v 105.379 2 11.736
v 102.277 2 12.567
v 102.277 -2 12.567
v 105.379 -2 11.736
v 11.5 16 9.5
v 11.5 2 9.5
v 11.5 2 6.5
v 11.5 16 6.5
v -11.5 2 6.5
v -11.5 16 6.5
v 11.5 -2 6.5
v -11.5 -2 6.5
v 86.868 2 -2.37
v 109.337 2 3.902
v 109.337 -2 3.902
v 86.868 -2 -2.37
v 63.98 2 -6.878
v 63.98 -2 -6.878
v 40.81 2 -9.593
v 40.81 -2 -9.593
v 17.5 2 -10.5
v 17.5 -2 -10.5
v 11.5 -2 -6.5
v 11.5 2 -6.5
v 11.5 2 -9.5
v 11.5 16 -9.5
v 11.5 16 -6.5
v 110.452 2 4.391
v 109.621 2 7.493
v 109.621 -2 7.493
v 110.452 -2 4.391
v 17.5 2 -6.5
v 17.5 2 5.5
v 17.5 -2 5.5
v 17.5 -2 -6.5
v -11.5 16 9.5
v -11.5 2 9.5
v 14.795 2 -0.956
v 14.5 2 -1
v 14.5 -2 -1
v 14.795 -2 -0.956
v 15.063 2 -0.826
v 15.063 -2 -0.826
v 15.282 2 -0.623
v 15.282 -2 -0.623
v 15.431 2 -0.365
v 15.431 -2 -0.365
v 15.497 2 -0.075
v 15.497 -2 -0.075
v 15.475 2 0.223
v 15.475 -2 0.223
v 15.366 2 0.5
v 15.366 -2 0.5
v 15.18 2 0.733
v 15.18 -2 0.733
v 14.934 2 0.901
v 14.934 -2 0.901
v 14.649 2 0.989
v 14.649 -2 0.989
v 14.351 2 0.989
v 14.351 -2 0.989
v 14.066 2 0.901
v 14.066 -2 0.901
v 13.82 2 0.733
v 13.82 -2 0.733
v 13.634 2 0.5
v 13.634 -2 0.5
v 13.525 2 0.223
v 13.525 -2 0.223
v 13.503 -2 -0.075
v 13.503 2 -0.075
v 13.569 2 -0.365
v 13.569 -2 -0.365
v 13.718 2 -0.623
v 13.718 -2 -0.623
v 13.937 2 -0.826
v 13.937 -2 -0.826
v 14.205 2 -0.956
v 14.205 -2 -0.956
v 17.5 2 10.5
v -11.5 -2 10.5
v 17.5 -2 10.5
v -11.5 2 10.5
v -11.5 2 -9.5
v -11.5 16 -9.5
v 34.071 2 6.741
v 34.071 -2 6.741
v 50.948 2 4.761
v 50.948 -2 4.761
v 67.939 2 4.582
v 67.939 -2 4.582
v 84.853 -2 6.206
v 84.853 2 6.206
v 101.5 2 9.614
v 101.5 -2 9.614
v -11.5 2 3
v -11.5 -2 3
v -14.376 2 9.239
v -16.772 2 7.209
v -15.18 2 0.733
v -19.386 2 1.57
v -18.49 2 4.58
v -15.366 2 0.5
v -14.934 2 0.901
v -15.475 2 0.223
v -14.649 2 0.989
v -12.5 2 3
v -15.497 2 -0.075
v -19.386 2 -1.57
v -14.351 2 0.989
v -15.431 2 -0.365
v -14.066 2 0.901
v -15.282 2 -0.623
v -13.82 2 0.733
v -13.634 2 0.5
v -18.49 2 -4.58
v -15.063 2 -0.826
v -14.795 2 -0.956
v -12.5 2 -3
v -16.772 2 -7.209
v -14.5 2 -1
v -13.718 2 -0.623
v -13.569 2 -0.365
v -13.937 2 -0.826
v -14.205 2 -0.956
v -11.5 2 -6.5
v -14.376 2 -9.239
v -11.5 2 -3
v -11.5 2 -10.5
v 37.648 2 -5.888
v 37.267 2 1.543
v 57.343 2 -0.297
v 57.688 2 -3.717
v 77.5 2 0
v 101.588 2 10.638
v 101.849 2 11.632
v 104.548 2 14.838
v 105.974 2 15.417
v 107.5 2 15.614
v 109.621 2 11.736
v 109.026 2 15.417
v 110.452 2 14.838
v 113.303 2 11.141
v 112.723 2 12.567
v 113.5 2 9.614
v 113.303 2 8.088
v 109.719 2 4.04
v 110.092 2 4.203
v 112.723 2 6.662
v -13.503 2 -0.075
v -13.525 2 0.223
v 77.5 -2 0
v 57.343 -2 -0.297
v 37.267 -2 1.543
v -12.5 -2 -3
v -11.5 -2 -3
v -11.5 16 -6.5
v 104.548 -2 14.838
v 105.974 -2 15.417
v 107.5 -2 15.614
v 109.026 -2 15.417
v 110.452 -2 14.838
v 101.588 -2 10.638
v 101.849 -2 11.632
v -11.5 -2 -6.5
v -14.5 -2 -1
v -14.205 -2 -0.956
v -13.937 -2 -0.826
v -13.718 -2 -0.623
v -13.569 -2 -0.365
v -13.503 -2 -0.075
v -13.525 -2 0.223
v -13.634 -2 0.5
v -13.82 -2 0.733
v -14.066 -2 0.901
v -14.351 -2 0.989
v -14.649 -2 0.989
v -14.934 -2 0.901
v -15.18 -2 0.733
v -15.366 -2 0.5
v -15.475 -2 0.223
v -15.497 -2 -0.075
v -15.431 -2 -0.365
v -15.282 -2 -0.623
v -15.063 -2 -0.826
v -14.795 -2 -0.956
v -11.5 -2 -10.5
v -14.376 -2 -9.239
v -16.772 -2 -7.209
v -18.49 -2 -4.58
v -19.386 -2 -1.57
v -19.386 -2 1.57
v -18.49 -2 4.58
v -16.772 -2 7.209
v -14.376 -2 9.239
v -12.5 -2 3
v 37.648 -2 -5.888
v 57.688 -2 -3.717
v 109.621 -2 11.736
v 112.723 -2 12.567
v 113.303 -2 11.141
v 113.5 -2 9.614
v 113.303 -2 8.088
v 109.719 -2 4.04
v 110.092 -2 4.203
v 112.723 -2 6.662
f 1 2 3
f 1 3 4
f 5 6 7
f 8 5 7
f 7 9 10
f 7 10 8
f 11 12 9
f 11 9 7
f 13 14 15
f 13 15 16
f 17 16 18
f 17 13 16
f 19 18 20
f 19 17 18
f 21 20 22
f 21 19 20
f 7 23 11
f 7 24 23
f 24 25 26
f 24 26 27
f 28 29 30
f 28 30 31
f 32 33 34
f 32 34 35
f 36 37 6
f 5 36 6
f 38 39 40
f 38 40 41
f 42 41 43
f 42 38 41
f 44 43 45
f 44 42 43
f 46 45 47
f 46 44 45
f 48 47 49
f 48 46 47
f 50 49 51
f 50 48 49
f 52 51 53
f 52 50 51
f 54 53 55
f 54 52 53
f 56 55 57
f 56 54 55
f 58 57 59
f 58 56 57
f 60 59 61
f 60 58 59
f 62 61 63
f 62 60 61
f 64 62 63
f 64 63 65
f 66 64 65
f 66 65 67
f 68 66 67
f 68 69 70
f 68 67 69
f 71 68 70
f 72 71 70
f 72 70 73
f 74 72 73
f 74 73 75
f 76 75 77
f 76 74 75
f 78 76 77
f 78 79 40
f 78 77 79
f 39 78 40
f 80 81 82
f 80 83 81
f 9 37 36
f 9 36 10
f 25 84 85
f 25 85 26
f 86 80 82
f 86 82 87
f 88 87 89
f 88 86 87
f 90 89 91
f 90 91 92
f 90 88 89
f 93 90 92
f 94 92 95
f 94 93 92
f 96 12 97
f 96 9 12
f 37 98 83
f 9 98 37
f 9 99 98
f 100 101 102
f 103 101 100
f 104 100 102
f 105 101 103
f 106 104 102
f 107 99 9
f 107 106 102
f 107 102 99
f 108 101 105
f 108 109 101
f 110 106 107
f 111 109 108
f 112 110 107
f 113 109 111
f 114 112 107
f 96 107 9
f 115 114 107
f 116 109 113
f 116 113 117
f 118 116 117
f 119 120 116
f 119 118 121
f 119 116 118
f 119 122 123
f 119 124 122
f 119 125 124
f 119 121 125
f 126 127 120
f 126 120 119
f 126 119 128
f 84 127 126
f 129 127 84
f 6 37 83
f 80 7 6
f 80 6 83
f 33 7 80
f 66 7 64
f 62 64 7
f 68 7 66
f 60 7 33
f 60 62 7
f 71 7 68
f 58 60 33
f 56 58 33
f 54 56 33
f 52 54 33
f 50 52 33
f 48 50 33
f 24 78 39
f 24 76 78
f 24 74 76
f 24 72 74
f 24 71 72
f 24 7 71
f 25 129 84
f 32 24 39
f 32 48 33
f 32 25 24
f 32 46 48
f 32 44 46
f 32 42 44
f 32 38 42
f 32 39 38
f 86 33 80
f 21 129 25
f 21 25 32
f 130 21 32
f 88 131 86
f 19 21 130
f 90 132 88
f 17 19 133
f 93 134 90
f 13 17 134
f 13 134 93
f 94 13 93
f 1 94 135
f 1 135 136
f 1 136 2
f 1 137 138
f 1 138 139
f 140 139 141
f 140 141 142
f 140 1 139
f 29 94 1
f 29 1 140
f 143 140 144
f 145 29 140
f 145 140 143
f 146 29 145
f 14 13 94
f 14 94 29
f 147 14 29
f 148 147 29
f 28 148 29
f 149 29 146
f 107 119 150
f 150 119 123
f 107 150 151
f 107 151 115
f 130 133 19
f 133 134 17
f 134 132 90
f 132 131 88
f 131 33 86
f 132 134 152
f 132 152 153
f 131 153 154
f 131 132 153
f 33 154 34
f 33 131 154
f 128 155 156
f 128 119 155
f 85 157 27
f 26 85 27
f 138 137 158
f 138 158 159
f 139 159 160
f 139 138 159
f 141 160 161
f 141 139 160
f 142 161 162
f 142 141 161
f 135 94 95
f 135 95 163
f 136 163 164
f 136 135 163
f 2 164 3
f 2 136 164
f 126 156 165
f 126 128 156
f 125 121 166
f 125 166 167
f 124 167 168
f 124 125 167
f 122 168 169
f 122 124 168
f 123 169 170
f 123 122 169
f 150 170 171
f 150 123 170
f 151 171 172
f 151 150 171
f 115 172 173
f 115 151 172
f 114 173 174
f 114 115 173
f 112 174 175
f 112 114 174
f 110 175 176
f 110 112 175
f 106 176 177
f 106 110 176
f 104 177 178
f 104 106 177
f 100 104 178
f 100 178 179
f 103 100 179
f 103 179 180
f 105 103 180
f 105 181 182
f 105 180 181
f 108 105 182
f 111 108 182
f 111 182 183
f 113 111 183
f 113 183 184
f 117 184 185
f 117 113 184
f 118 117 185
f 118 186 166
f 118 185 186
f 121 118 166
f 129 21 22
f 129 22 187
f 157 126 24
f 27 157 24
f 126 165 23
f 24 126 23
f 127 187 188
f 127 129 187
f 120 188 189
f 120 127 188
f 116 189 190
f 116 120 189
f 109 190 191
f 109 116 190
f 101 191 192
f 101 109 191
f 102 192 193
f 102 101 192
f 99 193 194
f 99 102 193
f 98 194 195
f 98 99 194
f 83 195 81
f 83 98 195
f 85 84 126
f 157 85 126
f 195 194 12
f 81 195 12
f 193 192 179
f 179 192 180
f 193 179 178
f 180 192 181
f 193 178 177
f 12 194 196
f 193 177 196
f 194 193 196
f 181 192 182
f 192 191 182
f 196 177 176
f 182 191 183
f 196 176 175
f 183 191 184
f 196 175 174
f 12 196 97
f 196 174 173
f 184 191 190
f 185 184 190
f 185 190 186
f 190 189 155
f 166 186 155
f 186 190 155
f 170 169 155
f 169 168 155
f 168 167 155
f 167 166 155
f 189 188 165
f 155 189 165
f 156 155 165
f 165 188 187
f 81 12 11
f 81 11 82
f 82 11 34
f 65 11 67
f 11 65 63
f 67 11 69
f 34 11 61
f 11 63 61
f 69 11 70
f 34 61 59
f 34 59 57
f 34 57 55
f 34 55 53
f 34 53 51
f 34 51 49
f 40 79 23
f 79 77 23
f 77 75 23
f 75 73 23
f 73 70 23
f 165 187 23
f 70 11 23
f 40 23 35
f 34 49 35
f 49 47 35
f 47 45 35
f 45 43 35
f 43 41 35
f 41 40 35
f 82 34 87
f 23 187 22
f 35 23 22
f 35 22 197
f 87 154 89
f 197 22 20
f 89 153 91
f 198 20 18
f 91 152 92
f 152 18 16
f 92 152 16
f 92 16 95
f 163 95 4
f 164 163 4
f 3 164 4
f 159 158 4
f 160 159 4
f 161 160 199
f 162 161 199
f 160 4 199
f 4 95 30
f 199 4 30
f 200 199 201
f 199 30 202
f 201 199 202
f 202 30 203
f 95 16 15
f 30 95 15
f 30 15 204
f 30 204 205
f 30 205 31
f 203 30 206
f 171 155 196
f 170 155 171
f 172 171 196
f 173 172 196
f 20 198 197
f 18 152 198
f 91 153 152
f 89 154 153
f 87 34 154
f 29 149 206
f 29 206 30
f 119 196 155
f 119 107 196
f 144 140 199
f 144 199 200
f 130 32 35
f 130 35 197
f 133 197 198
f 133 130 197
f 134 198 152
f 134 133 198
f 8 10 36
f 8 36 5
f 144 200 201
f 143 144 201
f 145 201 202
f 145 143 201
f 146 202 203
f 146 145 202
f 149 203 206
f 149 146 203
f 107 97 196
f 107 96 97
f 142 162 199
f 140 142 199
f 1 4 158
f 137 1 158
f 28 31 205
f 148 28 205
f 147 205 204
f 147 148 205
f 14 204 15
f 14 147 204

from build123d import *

# Parameters (mm, degrees)
EXTRUDE_1_DEPTH          = 2
EXTRUDE_2_DEPTH          = 4
CUT_EXTRUDE_1_DEPTH      = 115.638809515
CUT_EXTRUDE_1_DEPTH_BACK = 115.638809515
CUT_EXTRUDE_2_DEPTH      = 115.638809515
CUT_EXTRUDE_2_DEPTH_BACK = 115.638809515
SKETCH_5_R               = 1
SKETCH_6_W               = 23
SKETCH_6_H               = 3
EXTRUDE_3_DEPTH          = 14


with BuildPart() as part:
    # 草图1 → 凸台-拉伸1 (new, symmetric)
    with BuildSketch(Plane(origin=(0, 0, 0), x_dir=(1, 0, 0), z_dir=(0, 1, 0))):
        with BuildLine():
            Line((-11.5, -10.5), (17.5, -10.5))
            Line((17.5, -10.5), (17.5, 10.5))
            Line((17.5, 10.5), (-11.5, 10.5))
            ThreePointArc((-11.5, 10.5), (-19.5, 0), (-11.5, -10.5))
        make_face()
        Polygon((11.5, -6.5), (-11.5, -6.5), (-11.5, -3), (-12.5, -3), (-12.5, 3), (-11.5, 3), (-11.5, 6.5), (11.5, 6.5), align=None, mode=Mode.SUBTRACT)
    extrude(amount=EXTRUDE_1_DEPTH, both=True)

    # 草图2 → 凸台-拉伸2 (add)
    with BuildSketch(Plane(origin=(0, 2, 0), x_dir=(1, 0, 0), z_dir=(0, 1, 0))):
        with BuildLine():
            Line((17.5, -5.5), (17.5, -10.5))
            ThreePointArc((17.5, -10.5), (59.440835798, -4.44595009), (101.5, -9.614309047))
            ThreePointArc((101.5, -9.614309047), (111.034090536, -14.463041261), (109.336734694, -3.902356171))
            ThreePointArc((109.336734694, -3.902356171), (63.979602253, 6.877540604), (17.5, 10.5))
            Line((17.5, 10.5), (17.5, 6.5))
            ThreePointArc((17.5, 6.5), (47.689236459, 4.99679808), (77.5, 0))
            ThreePointArc((77.5, 0), (47.280596762, -0.356510126), (17.5, -5.5))
        make_face()
    extrude(amount=-EXTRUDE_2_DEPTH)

    # 草图4 → 切除-拉伸1 (cut, two sides: drawn at the far end of the back side and taken through both)
    with BuildSketch(Plane.XZ.offset(2).offset(-CUT_EXTRUDE_1_DEPTH_BACK)):
        with BuildLine():
            Line((102.276706609, 12.566800564), (105.378679656, 11.735629391))
            Line((105.378679656, 11.735629391), (104.547508484, 14.837602438))
            ThreePointArc((104.547508484, 14.837602438), (103.257359313, 13.856949735), (102.276706609, 12.566800564))
        make_face()
        with BuildLine():
            Line((110.452491516, 14.837602438), (109.621320344, 11.735629391))
            Line((109.621320344, 11.735629391), (112.723293391, 12.566800564))
            ThreePointArc((112.723293391, 12.566800564), (111.742640687, 13.856949735), (110.452491516, 14.837602438))
        make_face()
        with BuildLine():
            Line((112.723293391, 6.661817531), (109.621320344, 7.492988704))
            Line((109.621320344, 7.492988704), (110.452491516, 4.391015657))
            ThreePointArc((110.452491516, 4.391015657), (111.742640687, 5.37166836), (112.723293391, 6.661817531))
        make_face()
    extrude(amount=CUT_EXTRUDE_1_DEPTH + CUT_EXTRUDE_1_DEPTH_BACK, mode=Mode.SUBTRACT)

    # 草图5 → 切除-拉伸2 (cut, two sides: drawn at the far end of the back side and taken through both)
    with BuildSketch(Plane.XZ.offset(2).offset(-CUT_EXTRUDE_2_DEPTH_BACK)):
        with Locations(Location((14.5, 0, 0), (0, 0, 270))):
            Circle(SKETCH_5_R)
        with Locations(Location((-14.5, 0, 0), (0, 0, 270))):
            Circle(SKETCH_5_R)
    extrude(amount=CUT_EXTRUDE_2_DEPTH + CUT_EXTRUDE_2_DEPTH_BACK, mode=Mode.SUBTRACT)

    # 草图6 → 凸台-拉伸3 (add)
    with BuildSketch(Plane(origin=(0, 2, 0), x_dir=(1, 0, 0), z_dir=(0, 1, 0))):
        with Locations((0, -8)):
            Rectangle(SKETCH_6_W, SKETCH_6_H)
    extrude_3 = extrude(amount=EXTRUDE_3_DEPTH)

    # 镜向1: 凸台-拉伸3 across plane
    add(extrude_3.mirror(Plane.XY))


solid = part.part
